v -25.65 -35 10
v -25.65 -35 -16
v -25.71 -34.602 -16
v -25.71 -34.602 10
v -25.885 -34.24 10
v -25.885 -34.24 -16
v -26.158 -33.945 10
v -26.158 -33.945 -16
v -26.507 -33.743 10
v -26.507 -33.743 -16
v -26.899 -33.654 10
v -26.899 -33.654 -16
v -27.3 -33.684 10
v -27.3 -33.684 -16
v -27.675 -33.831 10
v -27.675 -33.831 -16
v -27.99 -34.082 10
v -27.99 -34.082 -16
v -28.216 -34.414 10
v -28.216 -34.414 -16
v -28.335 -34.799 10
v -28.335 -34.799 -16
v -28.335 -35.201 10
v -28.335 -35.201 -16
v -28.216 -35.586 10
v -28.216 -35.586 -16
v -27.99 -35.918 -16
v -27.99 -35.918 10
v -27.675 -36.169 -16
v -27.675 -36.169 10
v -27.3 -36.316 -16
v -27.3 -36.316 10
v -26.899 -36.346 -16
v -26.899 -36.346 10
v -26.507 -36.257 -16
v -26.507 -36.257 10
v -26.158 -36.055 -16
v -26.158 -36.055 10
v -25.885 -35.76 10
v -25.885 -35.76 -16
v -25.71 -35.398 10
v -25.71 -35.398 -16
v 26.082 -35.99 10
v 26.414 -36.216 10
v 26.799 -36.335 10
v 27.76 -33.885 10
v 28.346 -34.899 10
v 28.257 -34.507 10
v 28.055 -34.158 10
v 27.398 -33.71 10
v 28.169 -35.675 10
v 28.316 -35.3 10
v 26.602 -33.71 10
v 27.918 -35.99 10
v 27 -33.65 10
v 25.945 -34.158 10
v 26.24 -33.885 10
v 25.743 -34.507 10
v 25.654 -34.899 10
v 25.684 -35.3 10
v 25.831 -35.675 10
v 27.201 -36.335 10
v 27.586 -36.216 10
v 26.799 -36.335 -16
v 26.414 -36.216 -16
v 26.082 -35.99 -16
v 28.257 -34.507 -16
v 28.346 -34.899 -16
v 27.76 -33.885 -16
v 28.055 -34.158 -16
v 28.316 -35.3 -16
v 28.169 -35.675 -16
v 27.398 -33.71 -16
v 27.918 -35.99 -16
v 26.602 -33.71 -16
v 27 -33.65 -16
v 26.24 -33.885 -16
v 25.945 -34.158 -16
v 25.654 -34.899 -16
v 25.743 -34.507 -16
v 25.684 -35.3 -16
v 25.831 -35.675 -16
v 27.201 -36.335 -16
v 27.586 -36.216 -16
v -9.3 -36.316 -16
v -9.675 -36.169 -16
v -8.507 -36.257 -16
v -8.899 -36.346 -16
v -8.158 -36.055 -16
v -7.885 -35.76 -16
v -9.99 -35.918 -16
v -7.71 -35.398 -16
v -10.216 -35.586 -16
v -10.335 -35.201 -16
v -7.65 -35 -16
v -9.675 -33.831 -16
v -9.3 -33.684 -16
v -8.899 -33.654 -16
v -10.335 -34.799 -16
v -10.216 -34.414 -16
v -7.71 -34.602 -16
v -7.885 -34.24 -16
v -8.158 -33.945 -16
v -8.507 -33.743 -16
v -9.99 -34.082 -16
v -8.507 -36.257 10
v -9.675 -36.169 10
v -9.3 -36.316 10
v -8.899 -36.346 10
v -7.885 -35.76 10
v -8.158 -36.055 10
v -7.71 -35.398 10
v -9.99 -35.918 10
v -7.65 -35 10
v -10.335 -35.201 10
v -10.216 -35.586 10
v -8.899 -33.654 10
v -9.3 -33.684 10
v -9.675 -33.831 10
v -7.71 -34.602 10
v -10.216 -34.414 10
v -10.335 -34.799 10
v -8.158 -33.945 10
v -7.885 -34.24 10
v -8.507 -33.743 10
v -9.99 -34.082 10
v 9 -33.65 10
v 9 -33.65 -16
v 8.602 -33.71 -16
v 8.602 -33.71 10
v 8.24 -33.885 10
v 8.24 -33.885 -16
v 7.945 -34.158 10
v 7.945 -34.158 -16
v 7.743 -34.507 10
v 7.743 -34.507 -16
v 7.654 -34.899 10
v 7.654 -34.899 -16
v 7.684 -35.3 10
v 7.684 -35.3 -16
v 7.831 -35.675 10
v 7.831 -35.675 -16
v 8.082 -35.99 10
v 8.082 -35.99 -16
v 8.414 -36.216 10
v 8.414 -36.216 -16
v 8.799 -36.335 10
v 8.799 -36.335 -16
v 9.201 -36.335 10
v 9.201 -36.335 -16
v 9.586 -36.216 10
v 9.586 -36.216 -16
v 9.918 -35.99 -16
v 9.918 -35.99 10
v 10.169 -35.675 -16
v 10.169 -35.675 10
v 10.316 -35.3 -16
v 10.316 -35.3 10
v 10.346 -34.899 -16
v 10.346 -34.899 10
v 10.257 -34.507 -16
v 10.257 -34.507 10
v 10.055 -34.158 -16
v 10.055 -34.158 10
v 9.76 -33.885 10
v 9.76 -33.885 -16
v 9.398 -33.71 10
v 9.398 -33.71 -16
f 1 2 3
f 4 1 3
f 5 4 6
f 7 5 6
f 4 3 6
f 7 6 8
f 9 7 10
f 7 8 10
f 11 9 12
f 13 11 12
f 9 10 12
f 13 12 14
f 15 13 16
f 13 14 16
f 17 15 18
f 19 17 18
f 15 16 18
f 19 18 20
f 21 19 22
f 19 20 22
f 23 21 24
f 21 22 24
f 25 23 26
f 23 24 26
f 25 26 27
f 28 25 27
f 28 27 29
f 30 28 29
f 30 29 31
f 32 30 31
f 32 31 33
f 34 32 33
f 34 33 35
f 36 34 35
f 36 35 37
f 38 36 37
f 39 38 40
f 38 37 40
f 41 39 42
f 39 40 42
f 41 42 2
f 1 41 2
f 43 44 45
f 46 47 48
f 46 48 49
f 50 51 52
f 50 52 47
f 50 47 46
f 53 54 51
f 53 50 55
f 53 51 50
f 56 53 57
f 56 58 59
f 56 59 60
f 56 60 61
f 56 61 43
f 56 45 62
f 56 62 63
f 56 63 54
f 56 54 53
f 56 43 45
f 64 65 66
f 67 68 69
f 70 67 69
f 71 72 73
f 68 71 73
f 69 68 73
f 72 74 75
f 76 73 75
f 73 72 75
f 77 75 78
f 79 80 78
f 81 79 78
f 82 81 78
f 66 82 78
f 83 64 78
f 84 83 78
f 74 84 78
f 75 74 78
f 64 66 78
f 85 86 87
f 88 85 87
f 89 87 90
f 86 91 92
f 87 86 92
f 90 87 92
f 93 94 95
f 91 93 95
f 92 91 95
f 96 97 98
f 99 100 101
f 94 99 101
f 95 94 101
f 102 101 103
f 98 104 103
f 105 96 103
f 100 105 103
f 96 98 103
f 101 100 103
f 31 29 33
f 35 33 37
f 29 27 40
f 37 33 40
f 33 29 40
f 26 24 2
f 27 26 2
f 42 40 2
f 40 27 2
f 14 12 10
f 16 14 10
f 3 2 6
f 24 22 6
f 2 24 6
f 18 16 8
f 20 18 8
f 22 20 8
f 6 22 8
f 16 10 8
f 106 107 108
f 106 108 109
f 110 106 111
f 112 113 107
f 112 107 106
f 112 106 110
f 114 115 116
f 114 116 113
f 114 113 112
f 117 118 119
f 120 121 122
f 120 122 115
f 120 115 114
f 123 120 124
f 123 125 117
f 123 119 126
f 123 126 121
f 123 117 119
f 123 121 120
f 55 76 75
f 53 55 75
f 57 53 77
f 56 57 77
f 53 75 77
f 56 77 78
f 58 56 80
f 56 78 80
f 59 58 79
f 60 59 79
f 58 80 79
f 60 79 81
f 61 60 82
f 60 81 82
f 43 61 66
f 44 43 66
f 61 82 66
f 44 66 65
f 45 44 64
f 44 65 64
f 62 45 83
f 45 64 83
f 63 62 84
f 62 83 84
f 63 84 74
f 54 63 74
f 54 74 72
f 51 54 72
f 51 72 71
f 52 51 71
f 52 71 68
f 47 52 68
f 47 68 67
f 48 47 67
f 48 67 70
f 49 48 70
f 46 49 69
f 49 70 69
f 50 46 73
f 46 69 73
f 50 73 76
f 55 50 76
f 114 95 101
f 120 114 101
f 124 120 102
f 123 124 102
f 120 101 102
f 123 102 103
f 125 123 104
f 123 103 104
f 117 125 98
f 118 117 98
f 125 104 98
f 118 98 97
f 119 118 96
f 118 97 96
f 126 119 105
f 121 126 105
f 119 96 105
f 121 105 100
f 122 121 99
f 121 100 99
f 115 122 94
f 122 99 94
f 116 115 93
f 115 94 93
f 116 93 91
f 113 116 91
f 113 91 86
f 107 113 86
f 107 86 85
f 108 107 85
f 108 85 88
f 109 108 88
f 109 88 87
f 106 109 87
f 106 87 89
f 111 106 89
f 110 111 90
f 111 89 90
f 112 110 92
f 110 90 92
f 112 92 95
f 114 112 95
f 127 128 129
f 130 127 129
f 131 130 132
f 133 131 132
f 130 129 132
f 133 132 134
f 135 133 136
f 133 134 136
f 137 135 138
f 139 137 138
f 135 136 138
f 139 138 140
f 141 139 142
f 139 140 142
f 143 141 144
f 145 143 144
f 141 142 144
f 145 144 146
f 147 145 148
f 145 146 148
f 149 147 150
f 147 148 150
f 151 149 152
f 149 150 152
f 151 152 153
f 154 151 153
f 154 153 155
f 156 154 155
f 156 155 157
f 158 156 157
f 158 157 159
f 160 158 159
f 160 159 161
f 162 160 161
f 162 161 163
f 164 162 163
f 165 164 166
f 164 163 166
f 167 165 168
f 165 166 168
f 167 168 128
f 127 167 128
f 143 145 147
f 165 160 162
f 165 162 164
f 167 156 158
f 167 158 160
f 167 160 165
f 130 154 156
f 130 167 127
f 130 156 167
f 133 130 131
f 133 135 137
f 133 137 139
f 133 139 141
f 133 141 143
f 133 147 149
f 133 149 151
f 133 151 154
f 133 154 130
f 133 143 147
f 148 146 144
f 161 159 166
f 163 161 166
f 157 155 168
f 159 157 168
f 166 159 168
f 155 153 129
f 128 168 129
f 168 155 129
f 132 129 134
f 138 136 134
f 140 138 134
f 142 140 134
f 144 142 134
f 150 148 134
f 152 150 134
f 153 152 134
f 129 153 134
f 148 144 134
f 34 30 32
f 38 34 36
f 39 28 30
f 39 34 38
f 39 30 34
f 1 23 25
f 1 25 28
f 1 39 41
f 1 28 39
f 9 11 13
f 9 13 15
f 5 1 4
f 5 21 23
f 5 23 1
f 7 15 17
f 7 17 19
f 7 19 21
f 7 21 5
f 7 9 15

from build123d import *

# Parameters (mm, degrees)
BOSS_EXTRUDE1_DEPTH        = 10
BOSS_EXTRUDE1_DEPTH_BACK   = 16
SKETCH1_R                  = 1.35
BOSS_EXTRUDE1_2_DEPTH      = 10
BOSS_EXTRUDE1_2_DEPTH_BACK = 16
BOSS_EXTRUDE1_3_DEPTH      = 10
BOSS_EXTRUDE1_3_DEPTH_BACK = 16
BOSS_EXTRUDE1_4_DEPTH      = 10
BOSS_EXTRUDE1_4_DEPTH_BACK = 16


with BuildPart() as part:
    # Sketch1 → Boss-Extrude1 (new, two sides: drawn at the far end of the back side and taken through both)
    with BuildSketch(Plane.XY.offset(-BOSS_EXTRUDE1_DEPTH_BACK)):
        with Locations((-27, -35)):
            Circle(SKETCH1_R)
    extrude(amount=BOSS_EXTRUDE1_DEPTH + BOSS_EXTRUDE1_DEPTH_BACK)


with BuildPart() as body_2:
    # Sketch1 → Boss-Extrude1 2 (new, two sides: drawn at the far end of the back side and taken through both)
    with BuildSketch(Plane.XY.offset(-BOSS_EXTRUDE1_2_DEPTH_BACK)):
        with Locations((-9, -35)):
            Circle(SKETCH1_R)
    extrude(amount=BOSS_EXTRUDE1_2_DEPTH + BOSS_EXTRUDE1_2_DEPTH_BACK)


with BuildPart() as body_3:
    # Sketch1 → Boss-Extrude1 3 (new, two sides: drawn at the far end of the back side and taken through both)
    with BuildSketch(Plane.XY.offset(-BOSS_EXTRUDE1_3_DEPTH_BACK)):
        with Locations(Location((27, -35, 0), (0, 0, 90))):
            Circle(SKETCH1_R)
    extrude(amount=BOSS_EXTRUDE1_3_DEPTH + BOSS_EXTRUDE1_3_DEPTH_BACK)


with BuildPart() as body_4:
    # Sketch1 → Boss-Extrude1 4 (new, two sides: drawn at the far end of the back side and taken through both)
    with BuildSketch(Plane.XY.offset(-BOSS_EXTRUDE1_4_DEPTH_BACK)):
        with Locations(Location((9, -35, 0), (0, 0, 90))):
            Circle(SKETCH1_R)
    extrude(amount=BOSS_EXTRUDE1_4_DEPTH + BOSS_EXTRUDE1_4_DEPTH_BACK)


solid = Compound([part.part, body_2.part, body_3.part, body_4.part])
